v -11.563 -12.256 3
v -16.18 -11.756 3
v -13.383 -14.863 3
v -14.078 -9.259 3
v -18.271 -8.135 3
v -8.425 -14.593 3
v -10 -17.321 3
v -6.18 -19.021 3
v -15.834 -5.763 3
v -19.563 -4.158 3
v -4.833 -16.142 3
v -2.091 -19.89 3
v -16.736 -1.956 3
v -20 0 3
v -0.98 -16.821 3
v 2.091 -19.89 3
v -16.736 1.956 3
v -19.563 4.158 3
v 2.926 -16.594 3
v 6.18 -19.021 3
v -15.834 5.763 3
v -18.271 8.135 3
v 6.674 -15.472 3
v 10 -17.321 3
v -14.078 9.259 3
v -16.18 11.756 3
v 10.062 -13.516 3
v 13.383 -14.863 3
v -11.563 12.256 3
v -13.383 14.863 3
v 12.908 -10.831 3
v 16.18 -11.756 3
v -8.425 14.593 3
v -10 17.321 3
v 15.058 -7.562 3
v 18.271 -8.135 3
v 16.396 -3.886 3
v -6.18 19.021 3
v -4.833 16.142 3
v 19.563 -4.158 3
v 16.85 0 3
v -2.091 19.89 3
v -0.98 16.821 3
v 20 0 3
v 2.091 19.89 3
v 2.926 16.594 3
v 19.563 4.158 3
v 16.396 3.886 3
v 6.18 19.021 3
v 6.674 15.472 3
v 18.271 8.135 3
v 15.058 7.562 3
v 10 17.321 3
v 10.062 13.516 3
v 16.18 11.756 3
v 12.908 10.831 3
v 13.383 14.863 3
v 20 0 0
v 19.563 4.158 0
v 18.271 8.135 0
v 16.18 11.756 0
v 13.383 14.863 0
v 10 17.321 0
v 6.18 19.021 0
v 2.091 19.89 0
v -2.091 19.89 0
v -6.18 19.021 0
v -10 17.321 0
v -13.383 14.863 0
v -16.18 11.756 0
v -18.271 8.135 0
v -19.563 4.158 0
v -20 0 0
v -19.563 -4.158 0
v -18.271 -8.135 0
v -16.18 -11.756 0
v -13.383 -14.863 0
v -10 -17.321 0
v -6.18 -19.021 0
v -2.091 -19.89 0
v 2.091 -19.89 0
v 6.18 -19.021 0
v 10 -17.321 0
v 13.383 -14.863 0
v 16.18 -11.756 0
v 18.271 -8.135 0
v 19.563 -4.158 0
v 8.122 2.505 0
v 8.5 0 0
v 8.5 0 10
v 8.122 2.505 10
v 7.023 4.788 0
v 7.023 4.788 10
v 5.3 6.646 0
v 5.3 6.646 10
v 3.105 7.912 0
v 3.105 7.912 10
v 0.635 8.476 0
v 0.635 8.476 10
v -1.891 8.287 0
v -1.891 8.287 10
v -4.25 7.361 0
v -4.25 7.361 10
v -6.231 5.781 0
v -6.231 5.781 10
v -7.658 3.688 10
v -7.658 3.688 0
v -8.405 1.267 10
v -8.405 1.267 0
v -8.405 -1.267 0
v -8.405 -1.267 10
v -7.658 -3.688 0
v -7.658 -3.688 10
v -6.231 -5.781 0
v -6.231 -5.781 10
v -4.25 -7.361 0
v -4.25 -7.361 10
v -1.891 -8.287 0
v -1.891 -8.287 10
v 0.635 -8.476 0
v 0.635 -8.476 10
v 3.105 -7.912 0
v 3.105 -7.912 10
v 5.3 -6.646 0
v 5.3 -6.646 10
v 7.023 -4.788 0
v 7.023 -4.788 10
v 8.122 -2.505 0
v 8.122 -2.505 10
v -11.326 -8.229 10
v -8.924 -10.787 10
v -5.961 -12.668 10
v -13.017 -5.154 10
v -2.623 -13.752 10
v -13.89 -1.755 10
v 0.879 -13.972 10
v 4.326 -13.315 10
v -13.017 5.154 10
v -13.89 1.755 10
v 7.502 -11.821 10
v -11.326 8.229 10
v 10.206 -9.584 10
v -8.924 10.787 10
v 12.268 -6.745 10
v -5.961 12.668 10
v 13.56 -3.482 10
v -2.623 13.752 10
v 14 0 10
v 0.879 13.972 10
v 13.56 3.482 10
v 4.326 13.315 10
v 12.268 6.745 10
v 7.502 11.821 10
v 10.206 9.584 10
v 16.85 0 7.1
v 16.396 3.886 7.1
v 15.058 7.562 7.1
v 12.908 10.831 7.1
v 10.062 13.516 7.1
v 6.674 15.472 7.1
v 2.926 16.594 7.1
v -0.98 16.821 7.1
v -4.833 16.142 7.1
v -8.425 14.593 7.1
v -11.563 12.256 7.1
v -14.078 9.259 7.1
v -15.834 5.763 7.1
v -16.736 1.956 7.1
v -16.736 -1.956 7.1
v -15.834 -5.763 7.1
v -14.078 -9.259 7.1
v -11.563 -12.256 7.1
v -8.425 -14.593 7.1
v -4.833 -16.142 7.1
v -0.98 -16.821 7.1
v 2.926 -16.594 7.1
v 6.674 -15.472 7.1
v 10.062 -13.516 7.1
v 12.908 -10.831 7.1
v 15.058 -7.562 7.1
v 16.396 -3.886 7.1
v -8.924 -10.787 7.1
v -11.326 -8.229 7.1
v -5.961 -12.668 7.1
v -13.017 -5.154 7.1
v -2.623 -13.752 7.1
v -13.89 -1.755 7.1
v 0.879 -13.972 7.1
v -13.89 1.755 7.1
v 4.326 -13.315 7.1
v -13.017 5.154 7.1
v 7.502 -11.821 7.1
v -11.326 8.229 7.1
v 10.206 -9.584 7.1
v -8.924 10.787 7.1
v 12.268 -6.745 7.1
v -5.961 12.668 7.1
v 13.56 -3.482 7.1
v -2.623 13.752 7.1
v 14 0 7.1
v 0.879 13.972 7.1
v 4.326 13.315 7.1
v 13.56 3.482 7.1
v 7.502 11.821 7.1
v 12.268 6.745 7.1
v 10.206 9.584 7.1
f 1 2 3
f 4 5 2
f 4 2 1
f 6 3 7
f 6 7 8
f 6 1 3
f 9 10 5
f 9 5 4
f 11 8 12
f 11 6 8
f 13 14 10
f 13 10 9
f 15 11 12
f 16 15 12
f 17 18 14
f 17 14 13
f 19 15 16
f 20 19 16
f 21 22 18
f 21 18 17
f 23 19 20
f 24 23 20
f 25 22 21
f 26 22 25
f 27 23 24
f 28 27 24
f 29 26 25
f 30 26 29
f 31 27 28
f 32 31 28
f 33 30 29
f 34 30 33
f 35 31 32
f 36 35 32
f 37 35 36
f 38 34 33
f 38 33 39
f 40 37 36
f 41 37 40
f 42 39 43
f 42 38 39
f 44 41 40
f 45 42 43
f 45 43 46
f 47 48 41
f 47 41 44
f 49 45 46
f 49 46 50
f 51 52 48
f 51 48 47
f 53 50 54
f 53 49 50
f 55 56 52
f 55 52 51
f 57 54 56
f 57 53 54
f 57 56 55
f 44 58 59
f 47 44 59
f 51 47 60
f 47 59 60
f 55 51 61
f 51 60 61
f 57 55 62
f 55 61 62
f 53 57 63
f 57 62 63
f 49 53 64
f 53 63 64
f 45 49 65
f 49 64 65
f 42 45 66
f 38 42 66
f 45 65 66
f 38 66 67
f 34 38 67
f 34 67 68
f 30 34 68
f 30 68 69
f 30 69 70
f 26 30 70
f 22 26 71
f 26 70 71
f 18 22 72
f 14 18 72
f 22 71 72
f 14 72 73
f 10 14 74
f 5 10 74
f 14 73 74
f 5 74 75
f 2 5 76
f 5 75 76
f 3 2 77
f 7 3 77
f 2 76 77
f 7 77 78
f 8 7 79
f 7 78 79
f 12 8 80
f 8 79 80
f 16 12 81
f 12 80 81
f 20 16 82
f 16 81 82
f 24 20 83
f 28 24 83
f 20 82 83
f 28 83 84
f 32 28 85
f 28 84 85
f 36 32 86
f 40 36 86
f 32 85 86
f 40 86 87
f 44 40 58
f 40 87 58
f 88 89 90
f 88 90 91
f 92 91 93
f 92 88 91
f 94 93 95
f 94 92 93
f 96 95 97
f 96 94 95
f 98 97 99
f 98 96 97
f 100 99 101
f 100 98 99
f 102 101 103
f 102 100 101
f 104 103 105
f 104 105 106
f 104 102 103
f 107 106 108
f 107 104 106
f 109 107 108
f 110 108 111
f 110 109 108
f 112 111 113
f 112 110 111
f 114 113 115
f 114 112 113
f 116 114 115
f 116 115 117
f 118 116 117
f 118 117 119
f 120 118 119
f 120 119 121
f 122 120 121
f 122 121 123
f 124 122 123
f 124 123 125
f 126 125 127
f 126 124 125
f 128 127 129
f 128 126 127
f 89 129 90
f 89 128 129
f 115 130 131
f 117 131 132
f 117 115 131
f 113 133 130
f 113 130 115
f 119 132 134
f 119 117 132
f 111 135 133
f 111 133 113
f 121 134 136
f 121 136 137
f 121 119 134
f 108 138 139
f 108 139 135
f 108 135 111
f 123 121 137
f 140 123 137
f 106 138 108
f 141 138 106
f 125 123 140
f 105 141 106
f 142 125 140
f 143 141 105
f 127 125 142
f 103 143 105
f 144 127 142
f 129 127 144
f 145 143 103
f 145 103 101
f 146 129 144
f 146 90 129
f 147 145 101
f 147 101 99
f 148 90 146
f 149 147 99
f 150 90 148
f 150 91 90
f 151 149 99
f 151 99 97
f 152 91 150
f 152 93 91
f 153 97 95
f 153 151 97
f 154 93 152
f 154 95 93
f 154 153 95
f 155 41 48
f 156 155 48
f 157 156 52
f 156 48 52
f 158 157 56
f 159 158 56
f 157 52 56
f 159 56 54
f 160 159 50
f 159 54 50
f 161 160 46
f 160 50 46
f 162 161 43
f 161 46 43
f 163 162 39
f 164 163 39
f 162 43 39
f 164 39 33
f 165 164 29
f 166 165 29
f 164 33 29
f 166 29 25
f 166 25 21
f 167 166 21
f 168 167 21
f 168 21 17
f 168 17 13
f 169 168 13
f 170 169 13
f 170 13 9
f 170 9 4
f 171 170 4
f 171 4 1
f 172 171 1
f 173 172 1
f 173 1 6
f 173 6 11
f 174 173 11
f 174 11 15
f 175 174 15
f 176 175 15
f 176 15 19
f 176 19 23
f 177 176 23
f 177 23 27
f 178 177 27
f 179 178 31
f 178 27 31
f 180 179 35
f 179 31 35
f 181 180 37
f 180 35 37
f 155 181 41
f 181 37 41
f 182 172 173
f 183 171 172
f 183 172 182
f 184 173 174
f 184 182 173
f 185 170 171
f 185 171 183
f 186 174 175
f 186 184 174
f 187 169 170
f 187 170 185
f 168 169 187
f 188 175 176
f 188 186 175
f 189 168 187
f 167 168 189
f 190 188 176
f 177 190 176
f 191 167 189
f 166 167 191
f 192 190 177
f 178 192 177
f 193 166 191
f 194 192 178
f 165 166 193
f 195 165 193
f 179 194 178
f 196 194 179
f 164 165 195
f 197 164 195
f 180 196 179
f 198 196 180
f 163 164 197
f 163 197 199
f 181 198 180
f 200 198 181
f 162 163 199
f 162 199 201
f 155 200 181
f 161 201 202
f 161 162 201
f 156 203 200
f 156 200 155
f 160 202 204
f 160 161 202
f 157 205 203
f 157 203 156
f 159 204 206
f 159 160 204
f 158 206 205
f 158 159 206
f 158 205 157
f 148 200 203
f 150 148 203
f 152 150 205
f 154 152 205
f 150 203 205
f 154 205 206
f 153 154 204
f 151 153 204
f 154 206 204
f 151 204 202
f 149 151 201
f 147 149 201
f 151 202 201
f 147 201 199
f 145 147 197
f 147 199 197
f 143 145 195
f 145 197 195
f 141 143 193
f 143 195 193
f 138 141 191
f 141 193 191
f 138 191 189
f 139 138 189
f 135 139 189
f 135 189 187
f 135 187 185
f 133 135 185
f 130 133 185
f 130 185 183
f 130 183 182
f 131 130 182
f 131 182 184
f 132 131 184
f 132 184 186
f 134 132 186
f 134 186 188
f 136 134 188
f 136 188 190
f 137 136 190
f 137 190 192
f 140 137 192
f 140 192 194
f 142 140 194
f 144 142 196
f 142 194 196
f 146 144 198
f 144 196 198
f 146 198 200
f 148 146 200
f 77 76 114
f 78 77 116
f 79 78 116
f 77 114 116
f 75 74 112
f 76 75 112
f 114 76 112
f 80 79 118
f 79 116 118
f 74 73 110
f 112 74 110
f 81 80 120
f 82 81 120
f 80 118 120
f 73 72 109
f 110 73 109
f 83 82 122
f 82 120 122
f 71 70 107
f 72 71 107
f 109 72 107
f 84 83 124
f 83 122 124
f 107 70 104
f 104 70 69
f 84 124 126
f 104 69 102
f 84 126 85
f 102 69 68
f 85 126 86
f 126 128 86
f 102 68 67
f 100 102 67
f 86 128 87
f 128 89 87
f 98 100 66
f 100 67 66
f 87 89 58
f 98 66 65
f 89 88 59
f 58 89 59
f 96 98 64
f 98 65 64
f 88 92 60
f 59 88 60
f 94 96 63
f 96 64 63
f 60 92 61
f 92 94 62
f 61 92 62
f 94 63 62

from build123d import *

# Parameters (mm, degrees)
SKETCH_1_R      = 20
SKETCH_1_R_2    = 16.85
EXTRUDE_1_DEPTH = 3
SKETCH_1_3_R    = 16.85
SKETCH_1_3_R_2  = 14
EXTRUDE_2_DEPTH = 7.1
SKETCH_1_4_R    = 14
SKETCH_1_4_R_2  = 8.5
EXTRUDE_3_DEPTH = 10


with BuildPart() as part:
    # 草图1 → 凸台-拉伸1 (new body)
    with BuildSketch(Plane.XY):
        Circle(SKETCH_1_R)
        Circle(SKETCH_1_R_2, mode=Mode.SUBTRACT)
    extrude(amount=EXTRUDE_1_DEPTH)

    # 草图1<3> → 凸台-拉伸2 (add)
    with BuildSketch(Plane.XY):
        Circle(SKETCH_1_3_R)
        Circle(SKETCH_1_3_R_2, mode=Mode.SUBTRACT)
    extrude(amount=EXTRUDE_2_DEPTH)

    # 草图1<4> → 凸台-拉伸3 (add)
    with BuildSketch(Plane.XY):
        Circle(SKETCH_1_4_R)
        Circle(SKETCH_1_4_R_2, mode=Mode.SUBTRACT)
    extrude(amount=EXTRUDE_3_DEPTH)


solid = part.part
